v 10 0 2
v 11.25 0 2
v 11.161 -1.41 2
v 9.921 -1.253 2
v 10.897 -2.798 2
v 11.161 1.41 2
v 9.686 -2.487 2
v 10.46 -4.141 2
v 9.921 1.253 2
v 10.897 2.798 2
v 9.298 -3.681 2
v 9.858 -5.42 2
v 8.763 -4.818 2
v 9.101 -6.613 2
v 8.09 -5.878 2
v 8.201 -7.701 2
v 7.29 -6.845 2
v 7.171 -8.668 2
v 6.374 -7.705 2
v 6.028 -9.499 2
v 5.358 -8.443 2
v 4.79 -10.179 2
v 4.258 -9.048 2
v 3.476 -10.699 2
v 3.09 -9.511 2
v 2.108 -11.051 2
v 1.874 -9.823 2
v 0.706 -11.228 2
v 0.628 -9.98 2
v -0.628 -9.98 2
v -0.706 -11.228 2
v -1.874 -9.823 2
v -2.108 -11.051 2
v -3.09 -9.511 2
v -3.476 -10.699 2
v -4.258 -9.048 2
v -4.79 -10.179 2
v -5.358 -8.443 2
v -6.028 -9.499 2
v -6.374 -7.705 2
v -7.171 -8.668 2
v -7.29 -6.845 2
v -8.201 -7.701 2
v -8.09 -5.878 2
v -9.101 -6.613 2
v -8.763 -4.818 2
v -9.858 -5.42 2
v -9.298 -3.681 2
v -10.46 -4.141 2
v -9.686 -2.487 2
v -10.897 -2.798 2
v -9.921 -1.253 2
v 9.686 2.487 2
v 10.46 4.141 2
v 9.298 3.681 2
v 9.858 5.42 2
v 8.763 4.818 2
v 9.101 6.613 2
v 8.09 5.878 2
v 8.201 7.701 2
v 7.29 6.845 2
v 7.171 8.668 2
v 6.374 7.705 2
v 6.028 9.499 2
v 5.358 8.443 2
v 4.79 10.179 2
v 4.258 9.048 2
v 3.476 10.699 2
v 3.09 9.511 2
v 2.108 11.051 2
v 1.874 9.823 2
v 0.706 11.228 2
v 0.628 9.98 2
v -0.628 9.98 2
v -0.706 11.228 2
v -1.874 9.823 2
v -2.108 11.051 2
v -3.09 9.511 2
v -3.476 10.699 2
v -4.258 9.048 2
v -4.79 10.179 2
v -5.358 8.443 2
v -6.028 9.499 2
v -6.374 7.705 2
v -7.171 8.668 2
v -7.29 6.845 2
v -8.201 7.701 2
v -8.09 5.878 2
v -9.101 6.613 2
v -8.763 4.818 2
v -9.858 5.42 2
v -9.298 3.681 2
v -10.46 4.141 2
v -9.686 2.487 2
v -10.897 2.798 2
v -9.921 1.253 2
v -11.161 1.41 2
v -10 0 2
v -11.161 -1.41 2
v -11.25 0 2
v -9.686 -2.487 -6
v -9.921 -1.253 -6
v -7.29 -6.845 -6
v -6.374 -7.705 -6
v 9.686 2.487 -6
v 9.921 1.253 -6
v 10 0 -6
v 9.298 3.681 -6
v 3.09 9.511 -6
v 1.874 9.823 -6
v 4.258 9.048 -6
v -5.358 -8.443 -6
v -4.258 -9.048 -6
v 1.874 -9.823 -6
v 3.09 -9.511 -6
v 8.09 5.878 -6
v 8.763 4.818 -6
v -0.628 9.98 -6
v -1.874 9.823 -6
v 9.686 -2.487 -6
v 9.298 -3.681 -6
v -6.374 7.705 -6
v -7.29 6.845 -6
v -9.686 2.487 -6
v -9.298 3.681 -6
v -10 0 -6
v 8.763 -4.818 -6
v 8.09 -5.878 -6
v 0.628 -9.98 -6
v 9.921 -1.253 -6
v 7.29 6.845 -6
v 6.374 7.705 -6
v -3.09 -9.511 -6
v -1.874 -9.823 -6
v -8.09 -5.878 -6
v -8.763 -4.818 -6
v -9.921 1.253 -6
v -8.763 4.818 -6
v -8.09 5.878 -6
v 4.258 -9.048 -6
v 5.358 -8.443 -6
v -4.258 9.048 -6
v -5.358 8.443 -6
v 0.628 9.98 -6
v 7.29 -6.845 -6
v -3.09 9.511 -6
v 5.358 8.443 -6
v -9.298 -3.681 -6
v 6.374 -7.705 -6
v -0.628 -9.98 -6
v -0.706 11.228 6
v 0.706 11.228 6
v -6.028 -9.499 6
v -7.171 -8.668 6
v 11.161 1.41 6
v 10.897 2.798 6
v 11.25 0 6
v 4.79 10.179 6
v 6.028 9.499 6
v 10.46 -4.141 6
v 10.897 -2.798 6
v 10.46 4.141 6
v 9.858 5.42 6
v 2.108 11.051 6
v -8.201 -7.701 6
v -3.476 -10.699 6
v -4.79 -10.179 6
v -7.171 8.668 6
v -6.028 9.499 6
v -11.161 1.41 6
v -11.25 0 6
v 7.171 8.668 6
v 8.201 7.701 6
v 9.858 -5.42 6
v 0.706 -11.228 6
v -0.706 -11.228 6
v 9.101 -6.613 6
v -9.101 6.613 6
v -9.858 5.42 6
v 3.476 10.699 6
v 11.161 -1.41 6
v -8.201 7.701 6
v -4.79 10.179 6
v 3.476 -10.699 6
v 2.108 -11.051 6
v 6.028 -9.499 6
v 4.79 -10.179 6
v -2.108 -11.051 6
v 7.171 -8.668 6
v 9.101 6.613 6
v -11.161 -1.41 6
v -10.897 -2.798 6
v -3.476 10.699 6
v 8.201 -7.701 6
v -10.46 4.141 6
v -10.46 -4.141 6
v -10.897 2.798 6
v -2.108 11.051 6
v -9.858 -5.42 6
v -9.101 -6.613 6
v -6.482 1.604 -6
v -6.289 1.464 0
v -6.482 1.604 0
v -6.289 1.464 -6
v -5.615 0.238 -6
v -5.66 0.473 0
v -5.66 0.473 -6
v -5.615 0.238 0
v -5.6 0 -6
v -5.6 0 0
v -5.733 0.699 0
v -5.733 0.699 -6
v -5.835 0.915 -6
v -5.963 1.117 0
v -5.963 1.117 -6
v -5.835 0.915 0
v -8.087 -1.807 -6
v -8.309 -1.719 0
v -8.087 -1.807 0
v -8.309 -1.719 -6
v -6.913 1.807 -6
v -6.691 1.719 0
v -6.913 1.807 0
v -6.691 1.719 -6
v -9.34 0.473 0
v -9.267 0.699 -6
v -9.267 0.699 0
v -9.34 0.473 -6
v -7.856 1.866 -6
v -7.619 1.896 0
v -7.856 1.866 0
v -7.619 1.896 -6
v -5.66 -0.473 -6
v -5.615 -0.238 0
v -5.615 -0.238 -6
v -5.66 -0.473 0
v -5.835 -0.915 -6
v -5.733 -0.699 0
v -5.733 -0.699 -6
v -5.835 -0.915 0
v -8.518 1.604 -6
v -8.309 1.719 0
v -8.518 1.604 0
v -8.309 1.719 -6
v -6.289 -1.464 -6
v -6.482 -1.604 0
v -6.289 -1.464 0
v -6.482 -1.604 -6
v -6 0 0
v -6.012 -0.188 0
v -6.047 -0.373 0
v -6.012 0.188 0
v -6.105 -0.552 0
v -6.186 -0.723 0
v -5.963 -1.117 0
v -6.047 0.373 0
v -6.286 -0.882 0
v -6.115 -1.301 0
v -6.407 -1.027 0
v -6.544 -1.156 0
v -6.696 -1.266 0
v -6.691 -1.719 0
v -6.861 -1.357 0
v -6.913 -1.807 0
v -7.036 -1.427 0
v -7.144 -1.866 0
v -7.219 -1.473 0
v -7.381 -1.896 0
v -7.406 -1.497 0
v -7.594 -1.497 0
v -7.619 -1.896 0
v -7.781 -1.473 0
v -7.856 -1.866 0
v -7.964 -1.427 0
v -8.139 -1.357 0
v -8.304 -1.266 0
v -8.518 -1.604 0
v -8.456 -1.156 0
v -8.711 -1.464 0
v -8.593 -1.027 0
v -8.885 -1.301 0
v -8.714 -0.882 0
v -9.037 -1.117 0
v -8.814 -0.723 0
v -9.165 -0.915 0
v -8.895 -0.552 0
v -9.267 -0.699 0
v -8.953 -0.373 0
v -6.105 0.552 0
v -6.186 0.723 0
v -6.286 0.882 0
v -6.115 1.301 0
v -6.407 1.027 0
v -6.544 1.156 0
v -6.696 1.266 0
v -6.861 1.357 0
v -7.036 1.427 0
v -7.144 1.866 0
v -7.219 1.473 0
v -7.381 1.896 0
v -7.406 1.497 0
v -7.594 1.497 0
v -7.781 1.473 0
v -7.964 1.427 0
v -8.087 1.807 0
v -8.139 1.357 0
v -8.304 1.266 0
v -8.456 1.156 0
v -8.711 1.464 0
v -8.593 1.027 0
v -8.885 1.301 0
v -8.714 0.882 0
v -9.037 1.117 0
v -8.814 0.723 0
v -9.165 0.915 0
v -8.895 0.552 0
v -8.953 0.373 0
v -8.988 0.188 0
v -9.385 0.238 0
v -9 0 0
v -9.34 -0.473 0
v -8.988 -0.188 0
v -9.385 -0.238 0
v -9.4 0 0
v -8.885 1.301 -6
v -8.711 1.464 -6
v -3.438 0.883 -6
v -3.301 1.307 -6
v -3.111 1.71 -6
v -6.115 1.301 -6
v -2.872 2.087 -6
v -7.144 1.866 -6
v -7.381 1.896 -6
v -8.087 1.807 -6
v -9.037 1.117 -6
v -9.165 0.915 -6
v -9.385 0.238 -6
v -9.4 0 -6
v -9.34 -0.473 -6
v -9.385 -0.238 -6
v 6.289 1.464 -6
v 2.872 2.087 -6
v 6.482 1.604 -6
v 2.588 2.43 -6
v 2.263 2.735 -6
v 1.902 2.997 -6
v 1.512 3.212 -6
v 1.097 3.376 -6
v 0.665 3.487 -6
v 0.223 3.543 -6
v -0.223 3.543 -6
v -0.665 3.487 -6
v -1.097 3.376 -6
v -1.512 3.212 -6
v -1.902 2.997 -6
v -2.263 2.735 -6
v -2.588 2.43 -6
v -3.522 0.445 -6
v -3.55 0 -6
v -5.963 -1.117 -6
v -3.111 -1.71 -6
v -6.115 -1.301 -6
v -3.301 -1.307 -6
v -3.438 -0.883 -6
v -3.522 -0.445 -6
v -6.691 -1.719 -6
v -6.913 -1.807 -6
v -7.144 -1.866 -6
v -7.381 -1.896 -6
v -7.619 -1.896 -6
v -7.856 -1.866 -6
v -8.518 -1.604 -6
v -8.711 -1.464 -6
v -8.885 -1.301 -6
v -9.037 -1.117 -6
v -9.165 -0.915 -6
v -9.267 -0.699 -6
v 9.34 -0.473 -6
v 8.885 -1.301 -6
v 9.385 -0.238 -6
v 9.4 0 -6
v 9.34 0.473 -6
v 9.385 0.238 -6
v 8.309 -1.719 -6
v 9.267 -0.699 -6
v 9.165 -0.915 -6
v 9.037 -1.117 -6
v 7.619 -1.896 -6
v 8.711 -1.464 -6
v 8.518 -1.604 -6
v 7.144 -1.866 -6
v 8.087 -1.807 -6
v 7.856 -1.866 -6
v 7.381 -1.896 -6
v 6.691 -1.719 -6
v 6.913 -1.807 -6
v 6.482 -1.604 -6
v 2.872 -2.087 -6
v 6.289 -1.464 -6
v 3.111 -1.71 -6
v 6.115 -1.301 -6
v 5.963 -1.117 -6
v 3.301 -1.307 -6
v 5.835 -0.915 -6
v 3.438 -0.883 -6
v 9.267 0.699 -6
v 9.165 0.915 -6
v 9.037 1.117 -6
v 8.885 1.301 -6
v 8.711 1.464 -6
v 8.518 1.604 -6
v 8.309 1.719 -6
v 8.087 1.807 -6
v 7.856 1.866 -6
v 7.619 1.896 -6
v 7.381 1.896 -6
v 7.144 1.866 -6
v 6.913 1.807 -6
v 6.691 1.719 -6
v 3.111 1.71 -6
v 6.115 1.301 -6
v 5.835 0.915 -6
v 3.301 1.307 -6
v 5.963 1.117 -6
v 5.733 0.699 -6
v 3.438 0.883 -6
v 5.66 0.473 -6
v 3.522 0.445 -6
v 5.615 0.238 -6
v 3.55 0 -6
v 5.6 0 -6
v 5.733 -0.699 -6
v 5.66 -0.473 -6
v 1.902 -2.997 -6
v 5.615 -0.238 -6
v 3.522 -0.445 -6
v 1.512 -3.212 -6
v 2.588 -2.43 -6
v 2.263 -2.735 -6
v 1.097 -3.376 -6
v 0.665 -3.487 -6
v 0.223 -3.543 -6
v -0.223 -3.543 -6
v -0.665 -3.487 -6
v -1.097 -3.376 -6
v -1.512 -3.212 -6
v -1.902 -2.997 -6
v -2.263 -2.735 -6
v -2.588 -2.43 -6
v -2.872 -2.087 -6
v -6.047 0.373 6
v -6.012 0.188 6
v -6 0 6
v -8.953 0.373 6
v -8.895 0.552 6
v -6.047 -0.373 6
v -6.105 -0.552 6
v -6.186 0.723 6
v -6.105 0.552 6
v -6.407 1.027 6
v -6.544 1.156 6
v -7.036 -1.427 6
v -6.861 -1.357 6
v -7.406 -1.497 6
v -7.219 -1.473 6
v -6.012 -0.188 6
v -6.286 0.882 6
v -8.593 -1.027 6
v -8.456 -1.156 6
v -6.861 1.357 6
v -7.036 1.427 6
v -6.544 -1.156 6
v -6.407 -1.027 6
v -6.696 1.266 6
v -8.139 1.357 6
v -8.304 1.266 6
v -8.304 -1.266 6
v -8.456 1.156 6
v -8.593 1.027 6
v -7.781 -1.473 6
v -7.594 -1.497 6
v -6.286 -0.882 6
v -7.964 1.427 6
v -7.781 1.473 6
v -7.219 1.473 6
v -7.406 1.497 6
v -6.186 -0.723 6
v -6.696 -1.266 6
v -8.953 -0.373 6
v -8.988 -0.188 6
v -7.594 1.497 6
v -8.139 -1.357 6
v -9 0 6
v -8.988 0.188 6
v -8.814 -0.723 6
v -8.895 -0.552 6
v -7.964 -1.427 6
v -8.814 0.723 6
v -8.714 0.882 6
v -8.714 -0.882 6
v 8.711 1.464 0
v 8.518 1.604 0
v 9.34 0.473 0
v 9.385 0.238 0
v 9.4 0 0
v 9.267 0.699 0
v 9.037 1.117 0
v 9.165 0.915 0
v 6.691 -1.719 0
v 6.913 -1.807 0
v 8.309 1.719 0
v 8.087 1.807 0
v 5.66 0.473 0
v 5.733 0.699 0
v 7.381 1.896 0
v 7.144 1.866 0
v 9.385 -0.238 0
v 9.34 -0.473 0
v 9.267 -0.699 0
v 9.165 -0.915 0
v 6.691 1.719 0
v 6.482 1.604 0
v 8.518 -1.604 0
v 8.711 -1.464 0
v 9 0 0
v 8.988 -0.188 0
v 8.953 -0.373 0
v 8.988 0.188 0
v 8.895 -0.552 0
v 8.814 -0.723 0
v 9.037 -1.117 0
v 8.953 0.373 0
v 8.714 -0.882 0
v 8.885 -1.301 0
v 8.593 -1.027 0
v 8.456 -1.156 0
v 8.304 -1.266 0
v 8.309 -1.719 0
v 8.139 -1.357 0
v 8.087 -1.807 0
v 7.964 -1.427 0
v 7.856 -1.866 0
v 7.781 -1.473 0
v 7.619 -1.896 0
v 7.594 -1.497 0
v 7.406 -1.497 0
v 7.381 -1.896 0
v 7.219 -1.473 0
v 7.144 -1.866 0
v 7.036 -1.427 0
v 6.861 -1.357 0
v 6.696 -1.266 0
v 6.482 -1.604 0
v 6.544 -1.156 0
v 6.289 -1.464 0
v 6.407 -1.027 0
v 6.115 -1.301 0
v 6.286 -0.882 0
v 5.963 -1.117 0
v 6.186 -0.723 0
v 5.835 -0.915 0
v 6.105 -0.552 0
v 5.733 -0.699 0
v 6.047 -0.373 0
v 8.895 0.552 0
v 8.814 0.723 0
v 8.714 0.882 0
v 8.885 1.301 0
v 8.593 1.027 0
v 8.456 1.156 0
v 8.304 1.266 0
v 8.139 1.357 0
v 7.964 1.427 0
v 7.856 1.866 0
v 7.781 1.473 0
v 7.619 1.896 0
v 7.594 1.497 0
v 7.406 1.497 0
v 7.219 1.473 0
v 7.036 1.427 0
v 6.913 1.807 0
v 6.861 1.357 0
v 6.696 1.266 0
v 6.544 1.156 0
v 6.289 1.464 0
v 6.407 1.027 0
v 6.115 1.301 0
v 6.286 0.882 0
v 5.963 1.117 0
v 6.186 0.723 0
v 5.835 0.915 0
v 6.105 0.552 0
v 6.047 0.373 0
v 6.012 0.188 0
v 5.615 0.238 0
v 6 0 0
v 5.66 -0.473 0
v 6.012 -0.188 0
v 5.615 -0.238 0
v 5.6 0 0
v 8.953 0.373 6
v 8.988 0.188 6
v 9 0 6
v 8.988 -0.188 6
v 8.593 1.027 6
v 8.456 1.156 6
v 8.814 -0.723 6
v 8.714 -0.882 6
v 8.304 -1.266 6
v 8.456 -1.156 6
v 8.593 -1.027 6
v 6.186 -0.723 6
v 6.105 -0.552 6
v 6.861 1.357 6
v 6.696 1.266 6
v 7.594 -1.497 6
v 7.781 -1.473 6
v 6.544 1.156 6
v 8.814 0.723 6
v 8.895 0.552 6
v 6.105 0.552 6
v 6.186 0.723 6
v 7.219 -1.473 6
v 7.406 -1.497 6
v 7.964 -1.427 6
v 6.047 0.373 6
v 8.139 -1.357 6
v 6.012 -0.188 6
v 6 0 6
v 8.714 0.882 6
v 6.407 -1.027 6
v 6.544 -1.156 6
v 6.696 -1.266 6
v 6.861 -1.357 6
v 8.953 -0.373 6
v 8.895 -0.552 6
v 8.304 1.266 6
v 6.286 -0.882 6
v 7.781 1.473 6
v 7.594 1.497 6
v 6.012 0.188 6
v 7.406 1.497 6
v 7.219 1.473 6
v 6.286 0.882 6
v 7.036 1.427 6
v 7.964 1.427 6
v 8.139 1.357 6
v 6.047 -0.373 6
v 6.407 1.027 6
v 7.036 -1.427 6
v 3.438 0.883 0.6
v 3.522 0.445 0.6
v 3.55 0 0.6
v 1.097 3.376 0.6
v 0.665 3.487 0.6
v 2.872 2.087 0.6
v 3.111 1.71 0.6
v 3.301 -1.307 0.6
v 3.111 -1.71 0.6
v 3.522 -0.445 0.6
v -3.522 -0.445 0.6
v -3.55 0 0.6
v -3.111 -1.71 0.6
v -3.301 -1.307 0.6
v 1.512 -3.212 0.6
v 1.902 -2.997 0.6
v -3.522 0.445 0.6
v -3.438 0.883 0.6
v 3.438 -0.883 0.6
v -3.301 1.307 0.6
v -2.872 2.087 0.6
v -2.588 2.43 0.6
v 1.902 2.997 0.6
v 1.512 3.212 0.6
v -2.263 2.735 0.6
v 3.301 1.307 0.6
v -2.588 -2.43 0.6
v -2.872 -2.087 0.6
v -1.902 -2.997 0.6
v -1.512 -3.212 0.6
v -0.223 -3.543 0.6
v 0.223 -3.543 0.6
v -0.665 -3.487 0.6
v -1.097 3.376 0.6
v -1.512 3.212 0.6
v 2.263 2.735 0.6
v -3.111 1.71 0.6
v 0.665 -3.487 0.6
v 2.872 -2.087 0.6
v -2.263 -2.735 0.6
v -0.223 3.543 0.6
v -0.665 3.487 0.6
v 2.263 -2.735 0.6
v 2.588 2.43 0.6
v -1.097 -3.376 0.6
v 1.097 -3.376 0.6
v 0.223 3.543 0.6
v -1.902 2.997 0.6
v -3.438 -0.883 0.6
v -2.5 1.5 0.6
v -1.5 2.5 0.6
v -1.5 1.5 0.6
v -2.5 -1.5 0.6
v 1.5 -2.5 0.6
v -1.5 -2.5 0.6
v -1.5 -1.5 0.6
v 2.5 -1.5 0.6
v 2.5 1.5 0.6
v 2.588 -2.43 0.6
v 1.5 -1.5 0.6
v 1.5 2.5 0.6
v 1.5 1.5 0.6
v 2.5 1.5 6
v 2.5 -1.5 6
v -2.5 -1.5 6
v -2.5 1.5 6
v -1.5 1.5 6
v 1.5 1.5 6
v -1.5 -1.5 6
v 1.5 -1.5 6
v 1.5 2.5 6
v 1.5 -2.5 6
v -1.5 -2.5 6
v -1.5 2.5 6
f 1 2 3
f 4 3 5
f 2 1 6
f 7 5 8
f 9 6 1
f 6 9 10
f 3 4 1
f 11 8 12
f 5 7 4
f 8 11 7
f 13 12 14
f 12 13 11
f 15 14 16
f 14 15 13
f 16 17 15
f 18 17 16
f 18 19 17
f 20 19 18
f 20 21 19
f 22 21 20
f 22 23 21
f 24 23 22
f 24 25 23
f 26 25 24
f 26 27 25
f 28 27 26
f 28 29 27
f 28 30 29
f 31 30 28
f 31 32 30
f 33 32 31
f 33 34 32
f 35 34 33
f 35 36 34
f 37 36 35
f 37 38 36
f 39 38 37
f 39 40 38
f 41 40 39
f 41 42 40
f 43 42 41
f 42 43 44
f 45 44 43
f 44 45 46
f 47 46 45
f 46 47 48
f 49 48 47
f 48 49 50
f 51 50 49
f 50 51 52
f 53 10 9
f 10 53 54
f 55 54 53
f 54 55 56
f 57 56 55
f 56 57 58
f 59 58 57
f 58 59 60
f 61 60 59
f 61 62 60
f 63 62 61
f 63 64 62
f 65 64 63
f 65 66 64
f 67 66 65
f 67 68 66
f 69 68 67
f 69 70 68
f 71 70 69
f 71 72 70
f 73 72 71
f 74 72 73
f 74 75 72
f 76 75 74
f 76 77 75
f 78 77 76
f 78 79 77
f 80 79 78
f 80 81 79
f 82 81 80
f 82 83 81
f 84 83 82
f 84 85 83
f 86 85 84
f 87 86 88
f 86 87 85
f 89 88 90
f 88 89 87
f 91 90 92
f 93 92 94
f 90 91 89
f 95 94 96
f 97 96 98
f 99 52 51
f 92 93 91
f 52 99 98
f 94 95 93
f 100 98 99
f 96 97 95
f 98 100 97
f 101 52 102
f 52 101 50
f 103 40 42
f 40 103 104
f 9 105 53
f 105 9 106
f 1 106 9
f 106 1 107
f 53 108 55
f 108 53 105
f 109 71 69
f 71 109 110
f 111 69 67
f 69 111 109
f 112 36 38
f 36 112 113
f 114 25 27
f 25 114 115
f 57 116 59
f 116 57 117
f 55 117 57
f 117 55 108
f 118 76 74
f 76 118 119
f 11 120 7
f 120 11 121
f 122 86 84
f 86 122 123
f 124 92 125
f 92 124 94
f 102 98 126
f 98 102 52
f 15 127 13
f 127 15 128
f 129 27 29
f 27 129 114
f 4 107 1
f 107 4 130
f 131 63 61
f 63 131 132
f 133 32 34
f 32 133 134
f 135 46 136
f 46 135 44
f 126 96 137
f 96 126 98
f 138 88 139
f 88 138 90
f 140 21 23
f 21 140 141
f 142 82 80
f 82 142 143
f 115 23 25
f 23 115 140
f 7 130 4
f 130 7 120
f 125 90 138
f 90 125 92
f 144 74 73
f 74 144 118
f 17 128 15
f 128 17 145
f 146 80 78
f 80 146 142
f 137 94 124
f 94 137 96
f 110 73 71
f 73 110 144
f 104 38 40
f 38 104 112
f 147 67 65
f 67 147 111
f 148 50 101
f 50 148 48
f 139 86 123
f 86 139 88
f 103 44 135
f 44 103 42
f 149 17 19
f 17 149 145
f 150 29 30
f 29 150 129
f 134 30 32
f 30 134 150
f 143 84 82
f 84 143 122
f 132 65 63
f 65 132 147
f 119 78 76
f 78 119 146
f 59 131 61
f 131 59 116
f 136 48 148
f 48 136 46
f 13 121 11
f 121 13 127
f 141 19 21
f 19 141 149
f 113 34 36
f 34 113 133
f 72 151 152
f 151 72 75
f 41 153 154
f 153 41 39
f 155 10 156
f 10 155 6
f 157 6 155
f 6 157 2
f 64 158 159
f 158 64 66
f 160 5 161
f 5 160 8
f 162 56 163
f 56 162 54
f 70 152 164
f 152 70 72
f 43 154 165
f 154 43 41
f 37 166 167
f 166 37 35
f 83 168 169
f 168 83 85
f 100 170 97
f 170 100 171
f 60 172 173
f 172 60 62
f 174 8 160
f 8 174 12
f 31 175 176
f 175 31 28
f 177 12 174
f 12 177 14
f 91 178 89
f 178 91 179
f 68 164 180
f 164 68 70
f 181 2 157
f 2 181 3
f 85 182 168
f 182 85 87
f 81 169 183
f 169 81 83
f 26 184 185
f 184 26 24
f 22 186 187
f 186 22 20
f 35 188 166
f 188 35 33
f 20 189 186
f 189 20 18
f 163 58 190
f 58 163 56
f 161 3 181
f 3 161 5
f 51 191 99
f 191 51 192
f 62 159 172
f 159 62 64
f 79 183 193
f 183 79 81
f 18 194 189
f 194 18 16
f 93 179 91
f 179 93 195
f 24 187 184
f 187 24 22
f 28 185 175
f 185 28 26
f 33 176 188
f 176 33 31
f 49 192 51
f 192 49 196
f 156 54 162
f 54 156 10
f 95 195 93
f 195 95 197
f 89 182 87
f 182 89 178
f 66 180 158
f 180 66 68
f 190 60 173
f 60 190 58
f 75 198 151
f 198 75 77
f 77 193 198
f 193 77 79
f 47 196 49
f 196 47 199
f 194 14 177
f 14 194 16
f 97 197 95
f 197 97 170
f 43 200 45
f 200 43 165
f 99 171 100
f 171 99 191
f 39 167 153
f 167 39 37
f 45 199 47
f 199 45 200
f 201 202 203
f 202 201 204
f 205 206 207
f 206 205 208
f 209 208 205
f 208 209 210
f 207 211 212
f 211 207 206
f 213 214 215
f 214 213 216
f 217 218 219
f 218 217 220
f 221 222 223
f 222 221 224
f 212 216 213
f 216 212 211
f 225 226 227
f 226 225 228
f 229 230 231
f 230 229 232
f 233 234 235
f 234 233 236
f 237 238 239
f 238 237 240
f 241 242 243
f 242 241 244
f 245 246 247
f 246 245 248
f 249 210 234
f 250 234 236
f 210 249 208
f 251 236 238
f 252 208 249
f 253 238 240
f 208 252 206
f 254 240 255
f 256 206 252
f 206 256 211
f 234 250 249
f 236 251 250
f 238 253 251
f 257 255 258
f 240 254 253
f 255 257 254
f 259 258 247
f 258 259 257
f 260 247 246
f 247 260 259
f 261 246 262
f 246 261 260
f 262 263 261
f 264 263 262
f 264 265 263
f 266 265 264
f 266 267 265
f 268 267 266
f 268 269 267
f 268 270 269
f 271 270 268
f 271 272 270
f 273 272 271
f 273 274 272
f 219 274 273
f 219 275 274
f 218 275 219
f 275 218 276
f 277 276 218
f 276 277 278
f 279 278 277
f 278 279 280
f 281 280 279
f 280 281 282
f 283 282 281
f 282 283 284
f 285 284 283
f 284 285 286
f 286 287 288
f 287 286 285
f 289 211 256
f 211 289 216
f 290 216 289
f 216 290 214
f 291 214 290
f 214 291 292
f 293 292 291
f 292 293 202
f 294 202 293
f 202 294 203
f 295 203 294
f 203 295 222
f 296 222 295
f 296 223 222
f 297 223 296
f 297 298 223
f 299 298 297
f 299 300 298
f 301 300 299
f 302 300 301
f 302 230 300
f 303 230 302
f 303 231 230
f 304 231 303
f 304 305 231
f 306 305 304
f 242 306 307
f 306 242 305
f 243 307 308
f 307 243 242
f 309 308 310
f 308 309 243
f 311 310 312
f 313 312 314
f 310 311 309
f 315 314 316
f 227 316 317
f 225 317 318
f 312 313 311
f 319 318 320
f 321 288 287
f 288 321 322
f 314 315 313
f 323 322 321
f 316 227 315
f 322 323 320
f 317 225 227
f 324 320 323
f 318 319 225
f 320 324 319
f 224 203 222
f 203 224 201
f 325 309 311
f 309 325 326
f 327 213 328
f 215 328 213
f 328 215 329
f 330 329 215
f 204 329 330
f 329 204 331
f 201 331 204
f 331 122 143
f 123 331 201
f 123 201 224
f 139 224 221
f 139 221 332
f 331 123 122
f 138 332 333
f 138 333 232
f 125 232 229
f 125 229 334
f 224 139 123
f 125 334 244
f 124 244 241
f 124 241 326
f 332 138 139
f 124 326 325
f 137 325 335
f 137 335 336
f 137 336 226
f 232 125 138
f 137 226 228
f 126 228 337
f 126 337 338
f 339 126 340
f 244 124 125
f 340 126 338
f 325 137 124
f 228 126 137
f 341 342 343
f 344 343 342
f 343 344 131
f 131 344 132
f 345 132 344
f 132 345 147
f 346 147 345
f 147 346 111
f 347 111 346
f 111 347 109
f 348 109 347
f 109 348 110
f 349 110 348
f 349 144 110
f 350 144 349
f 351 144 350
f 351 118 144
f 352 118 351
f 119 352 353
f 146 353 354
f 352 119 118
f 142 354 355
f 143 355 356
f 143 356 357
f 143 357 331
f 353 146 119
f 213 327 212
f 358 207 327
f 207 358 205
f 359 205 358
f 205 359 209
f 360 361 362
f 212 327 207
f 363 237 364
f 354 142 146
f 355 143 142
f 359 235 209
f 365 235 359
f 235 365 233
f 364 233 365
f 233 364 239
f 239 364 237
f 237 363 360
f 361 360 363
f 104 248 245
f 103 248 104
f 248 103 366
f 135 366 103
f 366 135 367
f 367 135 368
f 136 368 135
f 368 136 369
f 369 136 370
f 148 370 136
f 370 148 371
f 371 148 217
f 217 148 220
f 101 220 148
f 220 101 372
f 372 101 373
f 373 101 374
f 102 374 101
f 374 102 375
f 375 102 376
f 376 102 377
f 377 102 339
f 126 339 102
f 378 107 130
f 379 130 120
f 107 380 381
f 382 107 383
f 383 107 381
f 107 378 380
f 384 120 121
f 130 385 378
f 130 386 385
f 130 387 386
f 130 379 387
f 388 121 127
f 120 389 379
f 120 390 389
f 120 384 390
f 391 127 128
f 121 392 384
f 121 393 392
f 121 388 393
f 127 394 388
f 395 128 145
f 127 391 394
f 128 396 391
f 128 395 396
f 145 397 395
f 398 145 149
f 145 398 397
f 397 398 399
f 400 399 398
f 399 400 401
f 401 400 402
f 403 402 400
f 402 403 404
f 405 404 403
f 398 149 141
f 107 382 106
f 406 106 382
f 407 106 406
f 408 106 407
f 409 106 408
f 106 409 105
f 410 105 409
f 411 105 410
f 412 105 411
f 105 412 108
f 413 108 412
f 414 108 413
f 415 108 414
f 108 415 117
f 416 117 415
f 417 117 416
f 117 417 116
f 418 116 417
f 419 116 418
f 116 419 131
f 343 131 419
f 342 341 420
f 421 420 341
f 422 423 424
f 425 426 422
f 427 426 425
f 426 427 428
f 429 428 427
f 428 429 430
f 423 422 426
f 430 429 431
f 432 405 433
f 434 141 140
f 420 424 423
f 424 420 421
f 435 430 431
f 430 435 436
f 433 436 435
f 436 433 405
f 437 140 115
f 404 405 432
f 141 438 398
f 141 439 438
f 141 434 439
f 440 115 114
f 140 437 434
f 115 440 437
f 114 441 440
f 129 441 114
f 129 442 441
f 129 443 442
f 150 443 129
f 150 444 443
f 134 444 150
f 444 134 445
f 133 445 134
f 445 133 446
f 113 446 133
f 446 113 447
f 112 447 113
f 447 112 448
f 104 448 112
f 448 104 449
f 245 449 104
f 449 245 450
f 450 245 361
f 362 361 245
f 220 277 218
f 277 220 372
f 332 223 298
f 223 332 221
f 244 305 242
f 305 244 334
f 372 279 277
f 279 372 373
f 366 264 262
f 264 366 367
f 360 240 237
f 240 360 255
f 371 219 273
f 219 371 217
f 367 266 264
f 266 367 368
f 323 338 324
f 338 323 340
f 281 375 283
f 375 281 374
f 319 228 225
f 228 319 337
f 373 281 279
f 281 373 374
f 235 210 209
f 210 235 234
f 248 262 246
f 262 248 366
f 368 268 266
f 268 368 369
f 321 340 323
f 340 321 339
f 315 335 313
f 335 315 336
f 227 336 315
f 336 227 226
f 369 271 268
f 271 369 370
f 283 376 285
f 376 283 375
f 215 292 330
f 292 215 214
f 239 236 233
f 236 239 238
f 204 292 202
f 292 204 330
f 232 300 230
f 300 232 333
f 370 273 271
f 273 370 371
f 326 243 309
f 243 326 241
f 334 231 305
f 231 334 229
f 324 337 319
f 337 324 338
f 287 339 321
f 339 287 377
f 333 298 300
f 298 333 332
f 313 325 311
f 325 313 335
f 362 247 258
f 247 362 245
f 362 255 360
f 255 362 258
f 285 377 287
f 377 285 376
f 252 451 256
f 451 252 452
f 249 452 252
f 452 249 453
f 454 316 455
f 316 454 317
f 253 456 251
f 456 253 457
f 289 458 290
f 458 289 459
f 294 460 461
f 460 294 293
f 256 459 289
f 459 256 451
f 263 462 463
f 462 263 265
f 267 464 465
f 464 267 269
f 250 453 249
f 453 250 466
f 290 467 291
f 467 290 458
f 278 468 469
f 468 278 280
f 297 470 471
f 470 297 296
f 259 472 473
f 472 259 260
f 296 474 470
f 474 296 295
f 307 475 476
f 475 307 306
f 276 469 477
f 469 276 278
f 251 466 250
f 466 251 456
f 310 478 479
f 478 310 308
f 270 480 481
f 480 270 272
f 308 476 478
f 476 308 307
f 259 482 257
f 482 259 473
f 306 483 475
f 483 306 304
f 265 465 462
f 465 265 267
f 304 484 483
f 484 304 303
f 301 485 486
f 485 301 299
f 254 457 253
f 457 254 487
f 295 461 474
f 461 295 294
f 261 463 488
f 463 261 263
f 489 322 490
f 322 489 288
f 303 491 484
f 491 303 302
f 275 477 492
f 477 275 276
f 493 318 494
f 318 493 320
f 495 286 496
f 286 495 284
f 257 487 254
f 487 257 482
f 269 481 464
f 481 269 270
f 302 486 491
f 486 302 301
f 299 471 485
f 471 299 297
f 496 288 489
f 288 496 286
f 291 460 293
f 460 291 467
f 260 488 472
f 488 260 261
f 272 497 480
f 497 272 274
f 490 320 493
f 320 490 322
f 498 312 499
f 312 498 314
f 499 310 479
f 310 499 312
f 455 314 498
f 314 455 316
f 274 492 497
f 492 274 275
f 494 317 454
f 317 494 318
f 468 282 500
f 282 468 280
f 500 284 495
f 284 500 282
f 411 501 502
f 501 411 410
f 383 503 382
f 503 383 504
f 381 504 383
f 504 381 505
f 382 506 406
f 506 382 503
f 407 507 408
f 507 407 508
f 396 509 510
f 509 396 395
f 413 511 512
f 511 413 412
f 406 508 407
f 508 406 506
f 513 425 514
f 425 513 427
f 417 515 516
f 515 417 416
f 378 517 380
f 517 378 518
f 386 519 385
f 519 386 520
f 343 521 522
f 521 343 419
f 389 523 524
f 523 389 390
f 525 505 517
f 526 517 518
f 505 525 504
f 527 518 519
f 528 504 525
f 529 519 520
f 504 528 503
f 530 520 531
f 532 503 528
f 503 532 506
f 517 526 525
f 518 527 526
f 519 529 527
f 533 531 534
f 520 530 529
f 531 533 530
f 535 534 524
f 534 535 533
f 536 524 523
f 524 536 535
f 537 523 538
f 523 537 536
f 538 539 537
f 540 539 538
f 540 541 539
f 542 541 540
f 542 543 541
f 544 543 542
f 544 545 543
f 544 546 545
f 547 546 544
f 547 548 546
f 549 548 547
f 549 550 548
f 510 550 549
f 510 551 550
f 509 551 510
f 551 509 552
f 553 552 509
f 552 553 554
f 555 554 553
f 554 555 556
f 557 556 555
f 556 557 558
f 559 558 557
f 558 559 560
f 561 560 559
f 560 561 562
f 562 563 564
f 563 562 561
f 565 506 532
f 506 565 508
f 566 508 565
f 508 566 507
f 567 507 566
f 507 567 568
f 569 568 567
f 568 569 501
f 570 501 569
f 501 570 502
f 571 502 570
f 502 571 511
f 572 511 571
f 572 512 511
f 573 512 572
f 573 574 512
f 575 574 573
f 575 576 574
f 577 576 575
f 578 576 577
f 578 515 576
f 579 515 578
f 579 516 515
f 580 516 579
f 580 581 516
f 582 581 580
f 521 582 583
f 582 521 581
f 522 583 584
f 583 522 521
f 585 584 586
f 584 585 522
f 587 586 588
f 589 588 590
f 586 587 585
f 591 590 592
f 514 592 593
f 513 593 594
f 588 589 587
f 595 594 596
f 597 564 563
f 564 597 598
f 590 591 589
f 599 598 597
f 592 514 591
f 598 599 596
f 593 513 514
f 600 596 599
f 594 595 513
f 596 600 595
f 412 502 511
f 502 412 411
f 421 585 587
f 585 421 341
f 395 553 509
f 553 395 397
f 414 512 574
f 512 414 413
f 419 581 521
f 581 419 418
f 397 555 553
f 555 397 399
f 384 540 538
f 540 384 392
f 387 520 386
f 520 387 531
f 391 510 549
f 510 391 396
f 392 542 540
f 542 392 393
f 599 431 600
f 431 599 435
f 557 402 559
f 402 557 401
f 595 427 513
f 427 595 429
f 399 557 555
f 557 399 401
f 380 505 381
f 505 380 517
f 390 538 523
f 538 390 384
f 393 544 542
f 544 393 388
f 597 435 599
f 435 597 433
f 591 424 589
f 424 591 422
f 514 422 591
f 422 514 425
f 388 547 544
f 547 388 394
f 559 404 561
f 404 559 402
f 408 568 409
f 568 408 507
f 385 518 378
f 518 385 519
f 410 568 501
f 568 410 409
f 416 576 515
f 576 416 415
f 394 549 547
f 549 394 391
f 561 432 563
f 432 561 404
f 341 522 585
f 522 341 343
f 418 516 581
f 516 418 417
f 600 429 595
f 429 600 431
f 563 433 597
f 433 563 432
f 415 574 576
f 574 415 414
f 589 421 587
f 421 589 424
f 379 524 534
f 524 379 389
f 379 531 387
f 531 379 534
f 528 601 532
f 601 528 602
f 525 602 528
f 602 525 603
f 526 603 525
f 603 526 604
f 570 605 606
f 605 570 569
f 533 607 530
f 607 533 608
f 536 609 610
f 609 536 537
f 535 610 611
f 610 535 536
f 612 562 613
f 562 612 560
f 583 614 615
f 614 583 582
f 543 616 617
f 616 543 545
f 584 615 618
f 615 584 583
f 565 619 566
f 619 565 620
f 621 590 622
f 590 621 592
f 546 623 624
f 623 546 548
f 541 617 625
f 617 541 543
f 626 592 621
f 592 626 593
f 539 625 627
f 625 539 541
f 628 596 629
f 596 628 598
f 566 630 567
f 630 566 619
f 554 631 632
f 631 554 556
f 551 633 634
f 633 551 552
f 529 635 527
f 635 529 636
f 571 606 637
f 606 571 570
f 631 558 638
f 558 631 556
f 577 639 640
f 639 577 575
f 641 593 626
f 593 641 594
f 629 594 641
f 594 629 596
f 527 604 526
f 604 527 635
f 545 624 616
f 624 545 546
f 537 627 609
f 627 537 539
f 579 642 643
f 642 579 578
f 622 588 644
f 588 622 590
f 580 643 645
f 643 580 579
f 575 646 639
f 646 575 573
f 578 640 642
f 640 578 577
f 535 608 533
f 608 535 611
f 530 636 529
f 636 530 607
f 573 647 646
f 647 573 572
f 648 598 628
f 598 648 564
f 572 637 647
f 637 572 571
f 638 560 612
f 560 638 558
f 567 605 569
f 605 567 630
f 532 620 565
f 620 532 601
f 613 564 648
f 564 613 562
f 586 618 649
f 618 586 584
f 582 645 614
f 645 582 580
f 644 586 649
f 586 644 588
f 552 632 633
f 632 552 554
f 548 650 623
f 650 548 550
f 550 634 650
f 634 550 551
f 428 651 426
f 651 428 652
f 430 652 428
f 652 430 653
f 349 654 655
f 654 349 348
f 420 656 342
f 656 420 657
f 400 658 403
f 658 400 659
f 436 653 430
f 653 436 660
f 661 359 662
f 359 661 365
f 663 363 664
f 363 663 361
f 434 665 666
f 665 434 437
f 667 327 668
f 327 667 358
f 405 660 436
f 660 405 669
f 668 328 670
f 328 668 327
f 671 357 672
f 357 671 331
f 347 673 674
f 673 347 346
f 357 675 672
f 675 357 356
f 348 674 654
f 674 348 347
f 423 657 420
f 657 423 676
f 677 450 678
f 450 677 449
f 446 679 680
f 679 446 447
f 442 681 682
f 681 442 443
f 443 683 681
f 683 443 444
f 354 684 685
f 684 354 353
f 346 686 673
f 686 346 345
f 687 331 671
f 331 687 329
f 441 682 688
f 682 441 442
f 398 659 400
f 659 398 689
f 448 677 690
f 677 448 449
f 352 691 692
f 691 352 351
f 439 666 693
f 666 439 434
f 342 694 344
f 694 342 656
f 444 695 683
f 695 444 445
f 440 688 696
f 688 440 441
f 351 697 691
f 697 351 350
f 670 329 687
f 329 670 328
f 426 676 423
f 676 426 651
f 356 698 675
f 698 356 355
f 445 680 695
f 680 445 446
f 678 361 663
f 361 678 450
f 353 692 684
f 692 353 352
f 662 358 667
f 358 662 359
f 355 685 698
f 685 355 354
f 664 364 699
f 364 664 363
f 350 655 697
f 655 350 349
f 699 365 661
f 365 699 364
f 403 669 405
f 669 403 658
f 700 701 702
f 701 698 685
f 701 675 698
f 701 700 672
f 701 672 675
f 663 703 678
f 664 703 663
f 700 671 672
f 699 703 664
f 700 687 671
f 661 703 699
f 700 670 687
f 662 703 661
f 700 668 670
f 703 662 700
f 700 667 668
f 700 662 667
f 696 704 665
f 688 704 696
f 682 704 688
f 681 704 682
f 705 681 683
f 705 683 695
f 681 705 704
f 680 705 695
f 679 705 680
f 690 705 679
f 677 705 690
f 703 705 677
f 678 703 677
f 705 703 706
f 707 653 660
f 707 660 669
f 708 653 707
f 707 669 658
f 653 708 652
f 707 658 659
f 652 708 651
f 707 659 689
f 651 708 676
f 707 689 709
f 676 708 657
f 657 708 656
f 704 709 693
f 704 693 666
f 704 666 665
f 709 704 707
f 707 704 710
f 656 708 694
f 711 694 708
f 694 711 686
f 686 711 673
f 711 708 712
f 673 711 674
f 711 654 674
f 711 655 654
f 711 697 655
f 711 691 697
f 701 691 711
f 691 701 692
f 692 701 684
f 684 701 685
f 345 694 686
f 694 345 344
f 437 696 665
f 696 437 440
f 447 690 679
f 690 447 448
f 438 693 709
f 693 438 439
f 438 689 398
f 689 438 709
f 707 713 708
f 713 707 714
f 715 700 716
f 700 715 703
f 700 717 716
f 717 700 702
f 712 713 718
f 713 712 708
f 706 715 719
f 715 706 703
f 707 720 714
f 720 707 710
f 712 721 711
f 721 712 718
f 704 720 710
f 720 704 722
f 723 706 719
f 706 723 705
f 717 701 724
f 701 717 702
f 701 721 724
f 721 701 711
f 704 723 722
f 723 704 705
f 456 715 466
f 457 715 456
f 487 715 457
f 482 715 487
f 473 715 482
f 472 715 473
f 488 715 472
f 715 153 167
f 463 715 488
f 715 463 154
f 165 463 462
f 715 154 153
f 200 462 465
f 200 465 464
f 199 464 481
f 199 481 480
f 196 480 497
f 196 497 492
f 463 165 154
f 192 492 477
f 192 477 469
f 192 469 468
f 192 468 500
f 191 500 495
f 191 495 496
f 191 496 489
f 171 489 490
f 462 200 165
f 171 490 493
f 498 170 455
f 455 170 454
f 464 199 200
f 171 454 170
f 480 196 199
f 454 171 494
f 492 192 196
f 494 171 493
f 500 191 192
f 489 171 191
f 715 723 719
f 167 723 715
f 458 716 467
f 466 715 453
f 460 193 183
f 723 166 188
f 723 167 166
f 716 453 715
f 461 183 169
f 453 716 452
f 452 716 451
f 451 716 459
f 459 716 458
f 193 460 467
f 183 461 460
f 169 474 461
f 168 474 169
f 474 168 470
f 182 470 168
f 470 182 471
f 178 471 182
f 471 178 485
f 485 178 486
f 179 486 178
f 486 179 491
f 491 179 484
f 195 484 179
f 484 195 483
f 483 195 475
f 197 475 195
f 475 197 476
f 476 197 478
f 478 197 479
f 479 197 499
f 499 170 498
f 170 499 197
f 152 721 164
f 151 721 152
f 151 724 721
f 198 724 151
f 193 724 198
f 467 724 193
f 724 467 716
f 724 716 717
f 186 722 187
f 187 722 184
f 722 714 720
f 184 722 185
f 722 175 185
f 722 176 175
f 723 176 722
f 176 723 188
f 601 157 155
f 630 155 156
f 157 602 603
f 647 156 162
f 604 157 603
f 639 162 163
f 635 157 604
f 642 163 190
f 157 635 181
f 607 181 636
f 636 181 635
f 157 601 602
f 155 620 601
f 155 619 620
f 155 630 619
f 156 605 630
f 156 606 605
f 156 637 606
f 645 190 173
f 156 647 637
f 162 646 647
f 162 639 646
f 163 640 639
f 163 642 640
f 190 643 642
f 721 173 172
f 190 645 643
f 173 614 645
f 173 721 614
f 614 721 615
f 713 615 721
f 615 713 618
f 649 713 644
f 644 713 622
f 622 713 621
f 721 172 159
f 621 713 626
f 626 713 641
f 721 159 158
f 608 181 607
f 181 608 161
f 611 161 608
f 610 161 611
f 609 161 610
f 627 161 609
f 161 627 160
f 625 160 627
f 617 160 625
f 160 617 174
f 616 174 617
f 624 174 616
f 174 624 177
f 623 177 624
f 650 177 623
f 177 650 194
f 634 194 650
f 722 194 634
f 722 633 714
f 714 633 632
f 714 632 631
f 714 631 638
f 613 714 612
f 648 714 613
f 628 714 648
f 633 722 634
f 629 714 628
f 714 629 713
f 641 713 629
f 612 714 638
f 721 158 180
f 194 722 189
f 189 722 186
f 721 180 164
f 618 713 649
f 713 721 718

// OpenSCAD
$fn = 50;

difference() {
	union() {
		translate(v = [0, 0, 0]) {
			rotate(a = [0, 0, 0]) {
				difference() {
					union() {
						translate(v = [0, 0, -6.0]) {
							cylinder(h = 12, r = 12);
						}
					}
					union() {
						translate(v = [0, 0, 0]) {
							rotate(a = [0, 0, 0]) {
								difference() {
									union() {
										translate(v = [0, 0, -2.0]) {
											cylinder(h = 4, r = 13.5);
										}
									}
									union() {
										translate(v = [0, 0, -2.01]) {
											cylinder(h = 4.02, r = 10.0);
										}
									}
								}
							}
						}
						translate(v = [0, 0, -3]) {
							rotate(a = [0, 0, 0]) {
								difference() {
									union() {
										translate(v = [0, 0, -2.0]) {
											cylinder(h = 4, r = 13.5);
										}
									}
									union() {
										translate(v = [0, 0, -2.01]) {
											cylinder(h = 4.02, r = 10.0);
										}
									}
								}
							}
						}
						translate(v = [0, 0, -6]) {
							rotate(a = [0, 0, 0]) {
								difference() {
									union() {
										translate(v = [0, 0, -2.0]) {
											cylinder(h = 4, r = 13.5);
										}
									}
									union() {
										translate(v = [0, 0, -2.01]) {
											cylinder(h = 4.02, r = 10.0);
										}
									}
								}
							}
						}
						translate(v = [0, 0, 0]) {
							rotate(a = [0, 0, 0]) {
								difference() {
									union() {
										translate(v = [0, 0, -21.0]) {
											cylinder(h = 42, r = 12.25);
										}
									}
									union() {
										translate(v = [0, 0, -21.01]) {
											cylinder(h = 42.02, r = 11.25);
										}
									}
								}
							}
						}
						translate(v = [-15.0, -15.0, -100.0]) {
							cylinder(h = 200, r = 3.0);
						}
						translate(v = [-15.0, 15.0, -100.0]) {
							cylinder(h = 200, r = 3.0);
						}
						translate(v = [15.0, -15.0, -100.0]) {
							cylinder(h = 200, r = 3.0);
						}
						translate(v = [15.0, 15.0, -100.0]) {
							cylinder(h = 200, r = 3.0);
						}
						translate(v = [-7.5, 0, -6.0]) {
							cylinder(h = 6, r = 1.9);
						}
						translate(v = [-7.5, 0, -7.0]) {
							cylinder(h = 14, r = 1.5);
						}
						translate(v = [7.5, 0, -6.0]) {
							cylinder(h = 6, r = 1.9);
						}
						translate(v = [7.5, 0, -7.0]) {
							cylinder(h = 14, r = 1.5);
						}
						translate(v = [0, 0, -6.000000000000001]) {
							cylinder(h = 6.6, r = 3.55);
						}
						translate(v = [-2.5, -1.5, -7.0]) {
							cube(size = [5, 3, 14]);
						}
						translate(v = [-1.5, -2.5, -7.0]) {
							cube(size = [3, 5, 14]);
						}
					}
				}
			}
		}
	}
	union();
}
